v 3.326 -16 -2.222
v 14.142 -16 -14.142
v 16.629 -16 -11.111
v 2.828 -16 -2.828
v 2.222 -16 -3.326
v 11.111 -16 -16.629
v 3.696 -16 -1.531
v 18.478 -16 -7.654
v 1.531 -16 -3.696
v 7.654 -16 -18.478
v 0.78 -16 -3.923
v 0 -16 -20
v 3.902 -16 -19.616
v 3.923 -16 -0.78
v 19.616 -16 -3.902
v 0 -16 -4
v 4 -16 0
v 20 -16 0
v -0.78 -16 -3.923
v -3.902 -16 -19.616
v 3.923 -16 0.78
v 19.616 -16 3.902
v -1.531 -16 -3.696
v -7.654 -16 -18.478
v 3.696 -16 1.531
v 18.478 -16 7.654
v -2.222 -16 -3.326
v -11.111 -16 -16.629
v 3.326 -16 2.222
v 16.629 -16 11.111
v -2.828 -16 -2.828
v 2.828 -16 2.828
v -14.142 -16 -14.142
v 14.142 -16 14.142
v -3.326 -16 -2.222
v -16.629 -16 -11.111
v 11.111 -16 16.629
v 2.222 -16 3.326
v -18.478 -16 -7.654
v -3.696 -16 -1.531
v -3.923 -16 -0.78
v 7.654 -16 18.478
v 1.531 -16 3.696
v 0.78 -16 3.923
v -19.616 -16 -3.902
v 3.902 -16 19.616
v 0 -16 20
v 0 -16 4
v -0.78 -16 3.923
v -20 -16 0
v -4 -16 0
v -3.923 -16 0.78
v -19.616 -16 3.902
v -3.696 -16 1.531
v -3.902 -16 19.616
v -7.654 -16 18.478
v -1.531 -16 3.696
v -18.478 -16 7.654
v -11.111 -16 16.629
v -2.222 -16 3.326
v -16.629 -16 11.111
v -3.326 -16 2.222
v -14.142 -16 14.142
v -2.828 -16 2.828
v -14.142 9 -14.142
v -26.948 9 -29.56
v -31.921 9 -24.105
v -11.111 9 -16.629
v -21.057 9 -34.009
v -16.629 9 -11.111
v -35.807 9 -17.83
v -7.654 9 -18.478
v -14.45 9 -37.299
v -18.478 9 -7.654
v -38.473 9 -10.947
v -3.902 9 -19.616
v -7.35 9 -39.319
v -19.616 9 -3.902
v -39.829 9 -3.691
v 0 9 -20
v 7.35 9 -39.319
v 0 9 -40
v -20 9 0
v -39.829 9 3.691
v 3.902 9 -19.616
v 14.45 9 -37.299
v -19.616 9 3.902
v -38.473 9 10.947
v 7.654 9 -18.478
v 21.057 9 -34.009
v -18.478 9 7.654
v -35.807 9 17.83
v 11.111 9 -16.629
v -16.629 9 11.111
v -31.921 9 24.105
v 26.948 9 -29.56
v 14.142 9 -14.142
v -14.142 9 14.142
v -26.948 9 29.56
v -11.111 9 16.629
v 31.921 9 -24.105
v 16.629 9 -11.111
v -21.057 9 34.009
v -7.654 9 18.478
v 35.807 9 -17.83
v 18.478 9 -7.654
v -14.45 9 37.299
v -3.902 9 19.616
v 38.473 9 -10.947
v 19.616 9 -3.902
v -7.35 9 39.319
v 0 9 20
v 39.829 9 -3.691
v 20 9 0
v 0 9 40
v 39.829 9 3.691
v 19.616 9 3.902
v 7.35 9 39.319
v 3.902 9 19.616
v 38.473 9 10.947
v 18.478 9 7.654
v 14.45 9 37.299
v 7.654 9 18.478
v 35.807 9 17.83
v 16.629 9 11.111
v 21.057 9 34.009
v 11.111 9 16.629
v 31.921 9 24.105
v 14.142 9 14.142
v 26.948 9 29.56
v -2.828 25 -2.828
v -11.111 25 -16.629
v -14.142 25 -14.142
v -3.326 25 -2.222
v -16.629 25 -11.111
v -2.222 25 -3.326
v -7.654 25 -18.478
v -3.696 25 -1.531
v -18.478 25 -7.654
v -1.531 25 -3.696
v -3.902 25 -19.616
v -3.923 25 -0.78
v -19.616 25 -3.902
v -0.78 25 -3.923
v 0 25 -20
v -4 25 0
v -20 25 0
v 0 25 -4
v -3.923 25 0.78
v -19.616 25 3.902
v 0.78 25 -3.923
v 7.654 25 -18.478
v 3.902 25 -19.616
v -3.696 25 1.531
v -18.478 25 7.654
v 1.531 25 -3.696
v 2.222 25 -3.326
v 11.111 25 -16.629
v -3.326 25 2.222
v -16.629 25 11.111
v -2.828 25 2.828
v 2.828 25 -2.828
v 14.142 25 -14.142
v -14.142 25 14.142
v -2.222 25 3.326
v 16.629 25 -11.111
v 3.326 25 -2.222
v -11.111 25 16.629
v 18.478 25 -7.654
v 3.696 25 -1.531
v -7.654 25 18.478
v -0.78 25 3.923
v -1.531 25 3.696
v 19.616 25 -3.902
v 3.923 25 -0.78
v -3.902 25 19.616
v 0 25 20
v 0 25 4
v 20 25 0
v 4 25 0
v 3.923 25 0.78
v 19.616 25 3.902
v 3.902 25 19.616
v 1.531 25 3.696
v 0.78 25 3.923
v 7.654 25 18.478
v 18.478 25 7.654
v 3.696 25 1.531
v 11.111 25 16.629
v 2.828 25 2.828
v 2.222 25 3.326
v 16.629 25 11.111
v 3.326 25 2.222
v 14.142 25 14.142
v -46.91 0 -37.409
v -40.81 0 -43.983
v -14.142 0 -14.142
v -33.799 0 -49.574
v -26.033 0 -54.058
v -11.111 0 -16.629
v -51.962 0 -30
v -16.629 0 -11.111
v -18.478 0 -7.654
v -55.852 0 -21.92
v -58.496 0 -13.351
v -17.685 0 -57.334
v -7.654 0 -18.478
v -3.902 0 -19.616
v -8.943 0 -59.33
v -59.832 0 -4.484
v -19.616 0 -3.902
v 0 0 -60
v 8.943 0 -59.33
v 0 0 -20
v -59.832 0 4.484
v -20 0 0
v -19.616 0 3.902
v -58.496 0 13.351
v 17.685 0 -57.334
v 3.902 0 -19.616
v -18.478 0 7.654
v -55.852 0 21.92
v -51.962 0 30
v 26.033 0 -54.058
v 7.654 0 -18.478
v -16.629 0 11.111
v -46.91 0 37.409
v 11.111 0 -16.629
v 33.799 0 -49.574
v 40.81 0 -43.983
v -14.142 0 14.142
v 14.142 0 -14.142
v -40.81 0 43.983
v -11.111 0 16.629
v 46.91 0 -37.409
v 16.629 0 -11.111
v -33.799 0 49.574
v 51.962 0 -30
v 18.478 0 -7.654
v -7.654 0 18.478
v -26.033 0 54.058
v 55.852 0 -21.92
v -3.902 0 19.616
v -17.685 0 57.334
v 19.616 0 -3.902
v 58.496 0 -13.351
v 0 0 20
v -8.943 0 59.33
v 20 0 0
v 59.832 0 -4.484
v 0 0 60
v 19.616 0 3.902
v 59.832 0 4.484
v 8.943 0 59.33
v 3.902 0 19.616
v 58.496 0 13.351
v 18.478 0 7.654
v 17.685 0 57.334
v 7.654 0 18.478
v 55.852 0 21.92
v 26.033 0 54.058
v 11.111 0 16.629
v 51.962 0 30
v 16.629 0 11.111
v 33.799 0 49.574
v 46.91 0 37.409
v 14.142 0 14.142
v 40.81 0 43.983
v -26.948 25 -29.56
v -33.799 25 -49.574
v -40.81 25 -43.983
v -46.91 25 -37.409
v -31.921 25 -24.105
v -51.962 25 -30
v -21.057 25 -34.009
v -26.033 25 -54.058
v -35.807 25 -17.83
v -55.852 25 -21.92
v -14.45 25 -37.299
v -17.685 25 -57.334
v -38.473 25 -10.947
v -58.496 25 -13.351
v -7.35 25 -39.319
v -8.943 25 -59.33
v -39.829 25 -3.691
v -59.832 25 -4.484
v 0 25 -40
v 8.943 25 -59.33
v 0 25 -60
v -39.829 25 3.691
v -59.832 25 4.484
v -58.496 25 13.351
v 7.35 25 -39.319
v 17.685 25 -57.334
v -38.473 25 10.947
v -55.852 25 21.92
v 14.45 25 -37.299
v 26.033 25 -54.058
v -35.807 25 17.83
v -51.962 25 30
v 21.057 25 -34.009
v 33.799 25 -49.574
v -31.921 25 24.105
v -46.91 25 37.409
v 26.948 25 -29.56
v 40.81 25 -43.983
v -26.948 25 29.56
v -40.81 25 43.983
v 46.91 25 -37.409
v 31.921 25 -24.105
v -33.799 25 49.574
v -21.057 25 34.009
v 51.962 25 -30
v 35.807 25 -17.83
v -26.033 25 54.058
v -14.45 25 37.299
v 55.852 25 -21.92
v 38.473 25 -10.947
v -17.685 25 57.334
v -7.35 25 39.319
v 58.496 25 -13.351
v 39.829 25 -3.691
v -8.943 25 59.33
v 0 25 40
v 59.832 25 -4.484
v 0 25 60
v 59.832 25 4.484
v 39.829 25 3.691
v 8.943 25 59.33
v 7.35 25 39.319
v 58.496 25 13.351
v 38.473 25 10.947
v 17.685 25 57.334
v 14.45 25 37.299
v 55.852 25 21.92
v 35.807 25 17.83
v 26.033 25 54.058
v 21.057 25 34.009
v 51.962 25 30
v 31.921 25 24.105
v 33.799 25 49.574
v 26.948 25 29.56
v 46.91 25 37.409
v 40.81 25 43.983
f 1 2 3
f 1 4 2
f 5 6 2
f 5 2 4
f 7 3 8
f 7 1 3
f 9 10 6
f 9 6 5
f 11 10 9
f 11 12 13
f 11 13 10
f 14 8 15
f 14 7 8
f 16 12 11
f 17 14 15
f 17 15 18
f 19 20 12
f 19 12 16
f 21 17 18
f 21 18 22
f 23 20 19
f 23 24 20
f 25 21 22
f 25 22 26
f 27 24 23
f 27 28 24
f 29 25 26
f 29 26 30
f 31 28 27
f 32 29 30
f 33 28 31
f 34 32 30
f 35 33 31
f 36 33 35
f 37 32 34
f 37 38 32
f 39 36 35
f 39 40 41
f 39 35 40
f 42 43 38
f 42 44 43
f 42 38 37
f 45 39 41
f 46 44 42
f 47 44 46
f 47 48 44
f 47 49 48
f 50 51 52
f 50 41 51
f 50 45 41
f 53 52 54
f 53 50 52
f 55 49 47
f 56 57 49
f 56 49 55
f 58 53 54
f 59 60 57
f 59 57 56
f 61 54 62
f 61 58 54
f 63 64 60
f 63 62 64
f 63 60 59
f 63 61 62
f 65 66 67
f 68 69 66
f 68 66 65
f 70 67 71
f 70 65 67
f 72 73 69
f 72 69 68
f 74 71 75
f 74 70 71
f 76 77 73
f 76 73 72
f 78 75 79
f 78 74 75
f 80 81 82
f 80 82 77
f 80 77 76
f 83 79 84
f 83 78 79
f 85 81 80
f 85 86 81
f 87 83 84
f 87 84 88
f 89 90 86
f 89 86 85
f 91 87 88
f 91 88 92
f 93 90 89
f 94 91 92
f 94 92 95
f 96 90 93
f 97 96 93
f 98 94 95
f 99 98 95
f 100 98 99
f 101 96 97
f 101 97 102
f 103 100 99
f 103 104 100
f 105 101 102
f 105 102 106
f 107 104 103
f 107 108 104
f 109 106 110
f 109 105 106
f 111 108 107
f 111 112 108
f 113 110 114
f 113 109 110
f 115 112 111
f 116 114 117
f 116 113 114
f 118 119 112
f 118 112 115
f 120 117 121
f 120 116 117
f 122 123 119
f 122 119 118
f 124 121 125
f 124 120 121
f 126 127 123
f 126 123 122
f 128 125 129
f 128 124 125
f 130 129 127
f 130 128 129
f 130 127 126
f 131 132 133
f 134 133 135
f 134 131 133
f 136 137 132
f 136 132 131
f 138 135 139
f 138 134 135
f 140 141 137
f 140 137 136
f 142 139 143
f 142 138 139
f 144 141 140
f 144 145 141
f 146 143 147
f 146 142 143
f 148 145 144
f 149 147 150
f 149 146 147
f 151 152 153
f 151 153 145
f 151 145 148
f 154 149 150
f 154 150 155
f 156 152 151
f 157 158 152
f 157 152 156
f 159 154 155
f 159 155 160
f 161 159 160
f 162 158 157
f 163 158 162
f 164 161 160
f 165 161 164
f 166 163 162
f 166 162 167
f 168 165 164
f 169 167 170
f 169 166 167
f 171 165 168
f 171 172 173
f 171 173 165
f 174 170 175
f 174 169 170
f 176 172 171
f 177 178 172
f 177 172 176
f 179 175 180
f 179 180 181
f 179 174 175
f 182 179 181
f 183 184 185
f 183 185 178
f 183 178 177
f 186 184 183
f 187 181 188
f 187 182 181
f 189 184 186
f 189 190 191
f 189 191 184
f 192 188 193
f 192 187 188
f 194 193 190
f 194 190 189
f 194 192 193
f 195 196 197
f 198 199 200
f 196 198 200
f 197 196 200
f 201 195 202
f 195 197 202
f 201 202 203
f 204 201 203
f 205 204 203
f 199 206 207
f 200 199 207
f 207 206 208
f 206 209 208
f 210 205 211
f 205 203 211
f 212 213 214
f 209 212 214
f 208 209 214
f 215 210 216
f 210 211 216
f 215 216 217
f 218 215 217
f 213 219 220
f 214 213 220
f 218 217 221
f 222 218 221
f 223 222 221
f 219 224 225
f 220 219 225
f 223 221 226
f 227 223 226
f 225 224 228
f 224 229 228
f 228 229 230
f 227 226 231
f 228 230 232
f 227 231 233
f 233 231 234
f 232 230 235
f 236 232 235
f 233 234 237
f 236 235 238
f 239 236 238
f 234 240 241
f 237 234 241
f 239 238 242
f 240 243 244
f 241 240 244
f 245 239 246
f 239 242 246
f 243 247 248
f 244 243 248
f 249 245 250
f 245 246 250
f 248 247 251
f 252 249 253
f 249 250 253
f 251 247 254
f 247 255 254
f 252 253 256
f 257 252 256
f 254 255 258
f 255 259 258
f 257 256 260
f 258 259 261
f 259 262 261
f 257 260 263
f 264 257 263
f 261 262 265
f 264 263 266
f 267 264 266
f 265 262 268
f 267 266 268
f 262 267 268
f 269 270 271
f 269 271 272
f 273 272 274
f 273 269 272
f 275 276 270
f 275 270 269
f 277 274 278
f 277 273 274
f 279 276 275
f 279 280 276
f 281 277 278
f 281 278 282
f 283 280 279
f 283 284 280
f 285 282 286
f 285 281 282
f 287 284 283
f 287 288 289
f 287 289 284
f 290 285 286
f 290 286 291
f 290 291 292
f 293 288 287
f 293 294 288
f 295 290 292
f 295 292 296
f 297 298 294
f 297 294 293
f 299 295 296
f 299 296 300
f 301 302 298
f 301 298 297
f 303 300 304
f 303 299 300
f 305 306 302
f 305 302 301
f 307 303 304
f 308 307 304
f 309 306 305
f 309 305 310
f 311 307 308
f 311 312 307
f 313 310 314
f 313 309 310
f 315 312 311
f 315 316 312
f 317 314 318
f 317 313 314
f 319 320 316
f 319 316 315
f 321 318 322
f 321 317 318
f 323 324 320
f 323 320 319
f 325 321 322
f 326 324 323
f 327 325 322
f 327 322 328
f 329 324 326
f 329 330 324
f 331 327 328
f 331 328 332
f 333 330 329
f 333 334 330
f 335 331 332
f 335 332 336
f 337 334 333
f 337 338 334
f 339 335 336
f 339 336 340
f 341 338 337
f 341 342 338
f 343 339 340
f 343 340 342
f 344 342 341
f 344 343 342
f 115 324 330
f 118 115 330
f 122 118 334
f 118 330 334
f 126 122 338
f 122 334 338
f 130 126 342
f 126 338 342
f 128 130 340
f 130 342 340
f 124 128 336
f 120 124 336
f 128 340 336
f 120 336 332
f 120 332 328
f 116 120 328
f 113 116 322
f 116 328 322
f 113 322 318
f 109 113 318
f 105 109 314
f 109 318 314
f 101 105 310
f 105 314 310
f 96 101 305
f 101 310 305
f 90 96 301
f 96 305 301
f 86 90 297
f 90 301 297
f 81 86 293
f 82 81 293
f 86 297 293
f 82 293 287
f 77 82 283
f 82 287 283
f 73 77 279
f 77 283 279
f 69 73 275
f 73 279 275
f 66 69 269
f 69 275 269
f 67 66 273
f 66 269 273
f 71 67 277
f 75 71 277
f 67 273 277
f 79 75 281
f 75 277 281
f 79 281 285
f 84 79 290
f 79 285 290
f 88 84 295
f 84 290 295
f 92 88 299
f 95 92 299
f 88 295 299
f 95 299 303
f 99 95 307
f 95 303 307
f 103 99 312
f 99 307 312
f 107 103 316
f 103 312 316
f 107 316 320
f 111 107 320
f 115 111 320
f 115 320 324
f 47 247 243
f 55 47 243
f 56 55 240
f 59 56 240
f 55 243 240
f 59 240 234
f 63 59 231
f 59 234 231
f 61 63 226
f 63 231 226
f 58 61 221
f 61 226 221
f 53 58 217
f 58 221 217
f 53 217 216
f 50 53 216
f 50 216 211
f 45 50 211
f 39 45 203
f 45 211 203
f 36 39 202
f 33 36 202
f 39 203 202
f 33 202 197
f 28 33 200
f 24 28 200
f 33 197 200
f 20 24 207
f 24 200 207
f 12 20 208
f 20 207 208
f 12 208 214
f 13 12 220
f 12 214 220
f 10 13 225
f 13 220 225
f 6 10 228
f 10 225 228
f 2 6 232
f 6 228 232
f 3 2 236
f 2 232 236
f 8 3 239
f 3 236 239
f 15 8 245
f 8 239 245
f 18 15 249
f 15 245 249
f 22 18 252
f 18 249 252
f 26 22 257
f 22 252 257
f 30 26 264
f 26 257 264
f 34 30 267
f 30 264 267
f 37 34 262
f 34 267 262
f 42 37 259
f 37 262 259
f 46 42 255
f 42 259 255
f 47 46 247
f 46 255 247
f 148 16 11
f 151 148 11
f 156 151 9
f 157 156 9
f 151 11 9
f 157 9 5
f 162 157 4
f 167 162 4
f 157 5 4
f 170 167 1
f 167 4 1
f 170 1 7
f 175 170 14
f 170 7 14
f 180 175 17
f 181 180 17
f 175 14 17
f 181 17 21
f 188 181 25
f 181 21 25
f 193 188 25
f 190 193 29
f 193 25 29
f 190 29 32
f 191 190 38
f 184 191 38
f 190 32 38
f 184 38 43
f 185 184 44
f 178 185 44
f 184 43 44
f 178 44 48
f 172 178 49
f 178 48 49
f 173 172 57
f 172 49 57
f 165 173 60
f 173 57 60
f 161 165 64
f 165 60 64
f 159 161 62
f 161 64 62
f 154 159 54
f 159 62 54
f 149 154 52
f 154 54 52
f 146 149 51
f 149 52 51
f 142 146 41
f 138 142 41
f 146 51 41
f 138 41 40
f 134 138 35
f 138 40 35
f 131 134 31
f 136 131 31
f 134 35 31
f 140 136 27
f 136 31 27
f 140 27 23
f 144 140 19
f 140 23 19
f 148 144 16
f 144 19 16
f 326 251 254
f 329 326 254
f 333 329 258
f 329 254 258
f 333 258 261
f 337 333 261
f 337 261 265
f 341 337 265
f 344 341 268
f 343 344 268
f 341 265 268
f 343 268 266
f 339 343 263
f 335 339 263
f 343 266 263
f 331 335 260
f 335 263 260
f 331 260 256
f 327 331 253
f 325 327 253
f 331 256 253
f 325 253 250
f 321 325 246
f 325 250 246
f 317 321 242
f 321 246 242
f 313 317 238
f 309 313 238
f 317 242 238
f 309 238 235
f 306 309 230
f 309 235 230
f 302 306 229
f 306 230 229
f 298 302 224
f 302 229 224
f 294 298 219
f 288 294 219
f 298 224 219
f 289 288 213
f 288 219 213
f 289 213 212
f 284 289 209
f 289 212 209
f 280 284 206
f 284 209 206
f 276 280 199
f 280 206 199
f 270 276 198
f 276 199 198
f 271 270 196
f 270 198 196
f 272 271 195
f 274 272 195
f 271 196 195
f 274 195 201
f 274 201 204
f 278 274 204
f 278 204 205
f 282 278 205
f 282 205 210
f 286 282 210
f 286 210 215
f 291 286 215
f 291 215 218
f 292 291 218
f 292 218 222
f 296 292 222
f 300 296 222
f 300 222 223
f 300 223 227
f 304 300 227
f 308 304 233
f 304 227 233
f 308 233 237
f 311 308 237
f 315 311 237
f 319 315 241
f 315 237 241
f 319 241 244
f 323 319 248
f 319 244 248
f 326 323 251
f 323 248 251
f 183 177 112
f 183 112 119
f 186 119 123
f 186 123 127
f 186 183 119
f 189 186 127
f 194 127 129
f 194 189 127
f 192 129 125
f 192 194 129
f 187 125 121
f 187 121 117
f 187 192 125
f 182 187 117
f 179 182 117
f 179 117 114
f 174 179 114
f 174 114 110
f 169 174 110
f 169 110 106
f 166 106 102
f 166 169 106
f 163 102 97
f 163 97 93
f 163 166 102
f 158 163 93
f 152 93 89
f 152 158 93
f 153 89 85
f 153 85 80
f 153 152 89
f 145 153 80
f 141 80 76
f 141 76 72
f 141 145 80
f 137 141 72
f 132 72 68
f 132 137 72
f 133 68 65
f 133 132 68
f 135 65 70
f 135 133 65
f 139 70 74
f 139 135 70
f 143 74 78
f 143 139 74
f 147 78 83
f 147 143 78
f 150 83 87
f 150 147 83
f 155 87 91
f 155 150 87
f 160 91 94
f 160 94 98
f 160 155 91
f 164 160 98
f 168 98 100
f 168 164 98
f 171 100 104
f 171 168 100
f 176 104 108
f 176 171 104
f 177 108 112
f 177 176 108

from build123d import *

# Parameters (mm, degrees)
SKETCH1_R           = 60
BOSS_EXTRUDE1_DEPTH = 25
SKETCH2_R           = 40
SKETCH2_R_2         = 20
CUT_EXTRUDE1_DEPTH  = 16
SKETCH3_R           = 20
BOSS_EXTRUDE2_DEPTH = 16
SKETCH4_R           = 4
CUT_EXTRUDE2_DEPTH  = 41


with BuildPart() as part:
    # Sketch1 → Boss-Extrude1 (new body)
    with BuildSketch(Plane(origin=(0, 0, 0), x_dir=(1, 0, 0), z_dir=(0, 1, 0))):
        with Locations(Location((0, 0, 0), (0, 0, 270))):
            Circle(SKETCH1_R)
    extrude(amount=BOSS_EXTRUDE1_DEPTH)

    # Sketch2 → Cut-Extrude1 (cut)
    with BuildSketch(Plane(origin=(0, 25, 0), x_dir=(1, 0, 0), z_dir=(0, 1, 0))):
        with Locations(Location((0, 0, 0), (0, 0, 270))):
            Circle(SKETCH2_R)
        with Locations(Location((0, 0, 0), (0, 0, 270))):
            Circle(SKETCH2_R_2, mode=Mode.SUBTRACT)
    extrude(amount=-CUT_EXTRUDE1_DEPTH, mode=Mode.SUBTRACT)

    # Sketch3 → Boss-Extrude2 (add)
    with BuildSketch(Plane.XZ):
        with Locations(Location((0, 0, 0), (0, 0, 90))):
            Circle(SKETCH3_R)
    extrude(amount=BOSS_EXTRUDE2_DEPTH)

    # Sketch4 → Cut-Extrude2 (cut)
    with BuildSketch(Plane.XZ.offset(16)):
        with Locations(Location((0, 0, 0), (0, 0, 270))):
            Circle(SKETCH4_R)
    extrude(amount=-CUT_EXTRUDE2_DEPTH, mode=Mode.SUBTRACT)


solid = part.part
